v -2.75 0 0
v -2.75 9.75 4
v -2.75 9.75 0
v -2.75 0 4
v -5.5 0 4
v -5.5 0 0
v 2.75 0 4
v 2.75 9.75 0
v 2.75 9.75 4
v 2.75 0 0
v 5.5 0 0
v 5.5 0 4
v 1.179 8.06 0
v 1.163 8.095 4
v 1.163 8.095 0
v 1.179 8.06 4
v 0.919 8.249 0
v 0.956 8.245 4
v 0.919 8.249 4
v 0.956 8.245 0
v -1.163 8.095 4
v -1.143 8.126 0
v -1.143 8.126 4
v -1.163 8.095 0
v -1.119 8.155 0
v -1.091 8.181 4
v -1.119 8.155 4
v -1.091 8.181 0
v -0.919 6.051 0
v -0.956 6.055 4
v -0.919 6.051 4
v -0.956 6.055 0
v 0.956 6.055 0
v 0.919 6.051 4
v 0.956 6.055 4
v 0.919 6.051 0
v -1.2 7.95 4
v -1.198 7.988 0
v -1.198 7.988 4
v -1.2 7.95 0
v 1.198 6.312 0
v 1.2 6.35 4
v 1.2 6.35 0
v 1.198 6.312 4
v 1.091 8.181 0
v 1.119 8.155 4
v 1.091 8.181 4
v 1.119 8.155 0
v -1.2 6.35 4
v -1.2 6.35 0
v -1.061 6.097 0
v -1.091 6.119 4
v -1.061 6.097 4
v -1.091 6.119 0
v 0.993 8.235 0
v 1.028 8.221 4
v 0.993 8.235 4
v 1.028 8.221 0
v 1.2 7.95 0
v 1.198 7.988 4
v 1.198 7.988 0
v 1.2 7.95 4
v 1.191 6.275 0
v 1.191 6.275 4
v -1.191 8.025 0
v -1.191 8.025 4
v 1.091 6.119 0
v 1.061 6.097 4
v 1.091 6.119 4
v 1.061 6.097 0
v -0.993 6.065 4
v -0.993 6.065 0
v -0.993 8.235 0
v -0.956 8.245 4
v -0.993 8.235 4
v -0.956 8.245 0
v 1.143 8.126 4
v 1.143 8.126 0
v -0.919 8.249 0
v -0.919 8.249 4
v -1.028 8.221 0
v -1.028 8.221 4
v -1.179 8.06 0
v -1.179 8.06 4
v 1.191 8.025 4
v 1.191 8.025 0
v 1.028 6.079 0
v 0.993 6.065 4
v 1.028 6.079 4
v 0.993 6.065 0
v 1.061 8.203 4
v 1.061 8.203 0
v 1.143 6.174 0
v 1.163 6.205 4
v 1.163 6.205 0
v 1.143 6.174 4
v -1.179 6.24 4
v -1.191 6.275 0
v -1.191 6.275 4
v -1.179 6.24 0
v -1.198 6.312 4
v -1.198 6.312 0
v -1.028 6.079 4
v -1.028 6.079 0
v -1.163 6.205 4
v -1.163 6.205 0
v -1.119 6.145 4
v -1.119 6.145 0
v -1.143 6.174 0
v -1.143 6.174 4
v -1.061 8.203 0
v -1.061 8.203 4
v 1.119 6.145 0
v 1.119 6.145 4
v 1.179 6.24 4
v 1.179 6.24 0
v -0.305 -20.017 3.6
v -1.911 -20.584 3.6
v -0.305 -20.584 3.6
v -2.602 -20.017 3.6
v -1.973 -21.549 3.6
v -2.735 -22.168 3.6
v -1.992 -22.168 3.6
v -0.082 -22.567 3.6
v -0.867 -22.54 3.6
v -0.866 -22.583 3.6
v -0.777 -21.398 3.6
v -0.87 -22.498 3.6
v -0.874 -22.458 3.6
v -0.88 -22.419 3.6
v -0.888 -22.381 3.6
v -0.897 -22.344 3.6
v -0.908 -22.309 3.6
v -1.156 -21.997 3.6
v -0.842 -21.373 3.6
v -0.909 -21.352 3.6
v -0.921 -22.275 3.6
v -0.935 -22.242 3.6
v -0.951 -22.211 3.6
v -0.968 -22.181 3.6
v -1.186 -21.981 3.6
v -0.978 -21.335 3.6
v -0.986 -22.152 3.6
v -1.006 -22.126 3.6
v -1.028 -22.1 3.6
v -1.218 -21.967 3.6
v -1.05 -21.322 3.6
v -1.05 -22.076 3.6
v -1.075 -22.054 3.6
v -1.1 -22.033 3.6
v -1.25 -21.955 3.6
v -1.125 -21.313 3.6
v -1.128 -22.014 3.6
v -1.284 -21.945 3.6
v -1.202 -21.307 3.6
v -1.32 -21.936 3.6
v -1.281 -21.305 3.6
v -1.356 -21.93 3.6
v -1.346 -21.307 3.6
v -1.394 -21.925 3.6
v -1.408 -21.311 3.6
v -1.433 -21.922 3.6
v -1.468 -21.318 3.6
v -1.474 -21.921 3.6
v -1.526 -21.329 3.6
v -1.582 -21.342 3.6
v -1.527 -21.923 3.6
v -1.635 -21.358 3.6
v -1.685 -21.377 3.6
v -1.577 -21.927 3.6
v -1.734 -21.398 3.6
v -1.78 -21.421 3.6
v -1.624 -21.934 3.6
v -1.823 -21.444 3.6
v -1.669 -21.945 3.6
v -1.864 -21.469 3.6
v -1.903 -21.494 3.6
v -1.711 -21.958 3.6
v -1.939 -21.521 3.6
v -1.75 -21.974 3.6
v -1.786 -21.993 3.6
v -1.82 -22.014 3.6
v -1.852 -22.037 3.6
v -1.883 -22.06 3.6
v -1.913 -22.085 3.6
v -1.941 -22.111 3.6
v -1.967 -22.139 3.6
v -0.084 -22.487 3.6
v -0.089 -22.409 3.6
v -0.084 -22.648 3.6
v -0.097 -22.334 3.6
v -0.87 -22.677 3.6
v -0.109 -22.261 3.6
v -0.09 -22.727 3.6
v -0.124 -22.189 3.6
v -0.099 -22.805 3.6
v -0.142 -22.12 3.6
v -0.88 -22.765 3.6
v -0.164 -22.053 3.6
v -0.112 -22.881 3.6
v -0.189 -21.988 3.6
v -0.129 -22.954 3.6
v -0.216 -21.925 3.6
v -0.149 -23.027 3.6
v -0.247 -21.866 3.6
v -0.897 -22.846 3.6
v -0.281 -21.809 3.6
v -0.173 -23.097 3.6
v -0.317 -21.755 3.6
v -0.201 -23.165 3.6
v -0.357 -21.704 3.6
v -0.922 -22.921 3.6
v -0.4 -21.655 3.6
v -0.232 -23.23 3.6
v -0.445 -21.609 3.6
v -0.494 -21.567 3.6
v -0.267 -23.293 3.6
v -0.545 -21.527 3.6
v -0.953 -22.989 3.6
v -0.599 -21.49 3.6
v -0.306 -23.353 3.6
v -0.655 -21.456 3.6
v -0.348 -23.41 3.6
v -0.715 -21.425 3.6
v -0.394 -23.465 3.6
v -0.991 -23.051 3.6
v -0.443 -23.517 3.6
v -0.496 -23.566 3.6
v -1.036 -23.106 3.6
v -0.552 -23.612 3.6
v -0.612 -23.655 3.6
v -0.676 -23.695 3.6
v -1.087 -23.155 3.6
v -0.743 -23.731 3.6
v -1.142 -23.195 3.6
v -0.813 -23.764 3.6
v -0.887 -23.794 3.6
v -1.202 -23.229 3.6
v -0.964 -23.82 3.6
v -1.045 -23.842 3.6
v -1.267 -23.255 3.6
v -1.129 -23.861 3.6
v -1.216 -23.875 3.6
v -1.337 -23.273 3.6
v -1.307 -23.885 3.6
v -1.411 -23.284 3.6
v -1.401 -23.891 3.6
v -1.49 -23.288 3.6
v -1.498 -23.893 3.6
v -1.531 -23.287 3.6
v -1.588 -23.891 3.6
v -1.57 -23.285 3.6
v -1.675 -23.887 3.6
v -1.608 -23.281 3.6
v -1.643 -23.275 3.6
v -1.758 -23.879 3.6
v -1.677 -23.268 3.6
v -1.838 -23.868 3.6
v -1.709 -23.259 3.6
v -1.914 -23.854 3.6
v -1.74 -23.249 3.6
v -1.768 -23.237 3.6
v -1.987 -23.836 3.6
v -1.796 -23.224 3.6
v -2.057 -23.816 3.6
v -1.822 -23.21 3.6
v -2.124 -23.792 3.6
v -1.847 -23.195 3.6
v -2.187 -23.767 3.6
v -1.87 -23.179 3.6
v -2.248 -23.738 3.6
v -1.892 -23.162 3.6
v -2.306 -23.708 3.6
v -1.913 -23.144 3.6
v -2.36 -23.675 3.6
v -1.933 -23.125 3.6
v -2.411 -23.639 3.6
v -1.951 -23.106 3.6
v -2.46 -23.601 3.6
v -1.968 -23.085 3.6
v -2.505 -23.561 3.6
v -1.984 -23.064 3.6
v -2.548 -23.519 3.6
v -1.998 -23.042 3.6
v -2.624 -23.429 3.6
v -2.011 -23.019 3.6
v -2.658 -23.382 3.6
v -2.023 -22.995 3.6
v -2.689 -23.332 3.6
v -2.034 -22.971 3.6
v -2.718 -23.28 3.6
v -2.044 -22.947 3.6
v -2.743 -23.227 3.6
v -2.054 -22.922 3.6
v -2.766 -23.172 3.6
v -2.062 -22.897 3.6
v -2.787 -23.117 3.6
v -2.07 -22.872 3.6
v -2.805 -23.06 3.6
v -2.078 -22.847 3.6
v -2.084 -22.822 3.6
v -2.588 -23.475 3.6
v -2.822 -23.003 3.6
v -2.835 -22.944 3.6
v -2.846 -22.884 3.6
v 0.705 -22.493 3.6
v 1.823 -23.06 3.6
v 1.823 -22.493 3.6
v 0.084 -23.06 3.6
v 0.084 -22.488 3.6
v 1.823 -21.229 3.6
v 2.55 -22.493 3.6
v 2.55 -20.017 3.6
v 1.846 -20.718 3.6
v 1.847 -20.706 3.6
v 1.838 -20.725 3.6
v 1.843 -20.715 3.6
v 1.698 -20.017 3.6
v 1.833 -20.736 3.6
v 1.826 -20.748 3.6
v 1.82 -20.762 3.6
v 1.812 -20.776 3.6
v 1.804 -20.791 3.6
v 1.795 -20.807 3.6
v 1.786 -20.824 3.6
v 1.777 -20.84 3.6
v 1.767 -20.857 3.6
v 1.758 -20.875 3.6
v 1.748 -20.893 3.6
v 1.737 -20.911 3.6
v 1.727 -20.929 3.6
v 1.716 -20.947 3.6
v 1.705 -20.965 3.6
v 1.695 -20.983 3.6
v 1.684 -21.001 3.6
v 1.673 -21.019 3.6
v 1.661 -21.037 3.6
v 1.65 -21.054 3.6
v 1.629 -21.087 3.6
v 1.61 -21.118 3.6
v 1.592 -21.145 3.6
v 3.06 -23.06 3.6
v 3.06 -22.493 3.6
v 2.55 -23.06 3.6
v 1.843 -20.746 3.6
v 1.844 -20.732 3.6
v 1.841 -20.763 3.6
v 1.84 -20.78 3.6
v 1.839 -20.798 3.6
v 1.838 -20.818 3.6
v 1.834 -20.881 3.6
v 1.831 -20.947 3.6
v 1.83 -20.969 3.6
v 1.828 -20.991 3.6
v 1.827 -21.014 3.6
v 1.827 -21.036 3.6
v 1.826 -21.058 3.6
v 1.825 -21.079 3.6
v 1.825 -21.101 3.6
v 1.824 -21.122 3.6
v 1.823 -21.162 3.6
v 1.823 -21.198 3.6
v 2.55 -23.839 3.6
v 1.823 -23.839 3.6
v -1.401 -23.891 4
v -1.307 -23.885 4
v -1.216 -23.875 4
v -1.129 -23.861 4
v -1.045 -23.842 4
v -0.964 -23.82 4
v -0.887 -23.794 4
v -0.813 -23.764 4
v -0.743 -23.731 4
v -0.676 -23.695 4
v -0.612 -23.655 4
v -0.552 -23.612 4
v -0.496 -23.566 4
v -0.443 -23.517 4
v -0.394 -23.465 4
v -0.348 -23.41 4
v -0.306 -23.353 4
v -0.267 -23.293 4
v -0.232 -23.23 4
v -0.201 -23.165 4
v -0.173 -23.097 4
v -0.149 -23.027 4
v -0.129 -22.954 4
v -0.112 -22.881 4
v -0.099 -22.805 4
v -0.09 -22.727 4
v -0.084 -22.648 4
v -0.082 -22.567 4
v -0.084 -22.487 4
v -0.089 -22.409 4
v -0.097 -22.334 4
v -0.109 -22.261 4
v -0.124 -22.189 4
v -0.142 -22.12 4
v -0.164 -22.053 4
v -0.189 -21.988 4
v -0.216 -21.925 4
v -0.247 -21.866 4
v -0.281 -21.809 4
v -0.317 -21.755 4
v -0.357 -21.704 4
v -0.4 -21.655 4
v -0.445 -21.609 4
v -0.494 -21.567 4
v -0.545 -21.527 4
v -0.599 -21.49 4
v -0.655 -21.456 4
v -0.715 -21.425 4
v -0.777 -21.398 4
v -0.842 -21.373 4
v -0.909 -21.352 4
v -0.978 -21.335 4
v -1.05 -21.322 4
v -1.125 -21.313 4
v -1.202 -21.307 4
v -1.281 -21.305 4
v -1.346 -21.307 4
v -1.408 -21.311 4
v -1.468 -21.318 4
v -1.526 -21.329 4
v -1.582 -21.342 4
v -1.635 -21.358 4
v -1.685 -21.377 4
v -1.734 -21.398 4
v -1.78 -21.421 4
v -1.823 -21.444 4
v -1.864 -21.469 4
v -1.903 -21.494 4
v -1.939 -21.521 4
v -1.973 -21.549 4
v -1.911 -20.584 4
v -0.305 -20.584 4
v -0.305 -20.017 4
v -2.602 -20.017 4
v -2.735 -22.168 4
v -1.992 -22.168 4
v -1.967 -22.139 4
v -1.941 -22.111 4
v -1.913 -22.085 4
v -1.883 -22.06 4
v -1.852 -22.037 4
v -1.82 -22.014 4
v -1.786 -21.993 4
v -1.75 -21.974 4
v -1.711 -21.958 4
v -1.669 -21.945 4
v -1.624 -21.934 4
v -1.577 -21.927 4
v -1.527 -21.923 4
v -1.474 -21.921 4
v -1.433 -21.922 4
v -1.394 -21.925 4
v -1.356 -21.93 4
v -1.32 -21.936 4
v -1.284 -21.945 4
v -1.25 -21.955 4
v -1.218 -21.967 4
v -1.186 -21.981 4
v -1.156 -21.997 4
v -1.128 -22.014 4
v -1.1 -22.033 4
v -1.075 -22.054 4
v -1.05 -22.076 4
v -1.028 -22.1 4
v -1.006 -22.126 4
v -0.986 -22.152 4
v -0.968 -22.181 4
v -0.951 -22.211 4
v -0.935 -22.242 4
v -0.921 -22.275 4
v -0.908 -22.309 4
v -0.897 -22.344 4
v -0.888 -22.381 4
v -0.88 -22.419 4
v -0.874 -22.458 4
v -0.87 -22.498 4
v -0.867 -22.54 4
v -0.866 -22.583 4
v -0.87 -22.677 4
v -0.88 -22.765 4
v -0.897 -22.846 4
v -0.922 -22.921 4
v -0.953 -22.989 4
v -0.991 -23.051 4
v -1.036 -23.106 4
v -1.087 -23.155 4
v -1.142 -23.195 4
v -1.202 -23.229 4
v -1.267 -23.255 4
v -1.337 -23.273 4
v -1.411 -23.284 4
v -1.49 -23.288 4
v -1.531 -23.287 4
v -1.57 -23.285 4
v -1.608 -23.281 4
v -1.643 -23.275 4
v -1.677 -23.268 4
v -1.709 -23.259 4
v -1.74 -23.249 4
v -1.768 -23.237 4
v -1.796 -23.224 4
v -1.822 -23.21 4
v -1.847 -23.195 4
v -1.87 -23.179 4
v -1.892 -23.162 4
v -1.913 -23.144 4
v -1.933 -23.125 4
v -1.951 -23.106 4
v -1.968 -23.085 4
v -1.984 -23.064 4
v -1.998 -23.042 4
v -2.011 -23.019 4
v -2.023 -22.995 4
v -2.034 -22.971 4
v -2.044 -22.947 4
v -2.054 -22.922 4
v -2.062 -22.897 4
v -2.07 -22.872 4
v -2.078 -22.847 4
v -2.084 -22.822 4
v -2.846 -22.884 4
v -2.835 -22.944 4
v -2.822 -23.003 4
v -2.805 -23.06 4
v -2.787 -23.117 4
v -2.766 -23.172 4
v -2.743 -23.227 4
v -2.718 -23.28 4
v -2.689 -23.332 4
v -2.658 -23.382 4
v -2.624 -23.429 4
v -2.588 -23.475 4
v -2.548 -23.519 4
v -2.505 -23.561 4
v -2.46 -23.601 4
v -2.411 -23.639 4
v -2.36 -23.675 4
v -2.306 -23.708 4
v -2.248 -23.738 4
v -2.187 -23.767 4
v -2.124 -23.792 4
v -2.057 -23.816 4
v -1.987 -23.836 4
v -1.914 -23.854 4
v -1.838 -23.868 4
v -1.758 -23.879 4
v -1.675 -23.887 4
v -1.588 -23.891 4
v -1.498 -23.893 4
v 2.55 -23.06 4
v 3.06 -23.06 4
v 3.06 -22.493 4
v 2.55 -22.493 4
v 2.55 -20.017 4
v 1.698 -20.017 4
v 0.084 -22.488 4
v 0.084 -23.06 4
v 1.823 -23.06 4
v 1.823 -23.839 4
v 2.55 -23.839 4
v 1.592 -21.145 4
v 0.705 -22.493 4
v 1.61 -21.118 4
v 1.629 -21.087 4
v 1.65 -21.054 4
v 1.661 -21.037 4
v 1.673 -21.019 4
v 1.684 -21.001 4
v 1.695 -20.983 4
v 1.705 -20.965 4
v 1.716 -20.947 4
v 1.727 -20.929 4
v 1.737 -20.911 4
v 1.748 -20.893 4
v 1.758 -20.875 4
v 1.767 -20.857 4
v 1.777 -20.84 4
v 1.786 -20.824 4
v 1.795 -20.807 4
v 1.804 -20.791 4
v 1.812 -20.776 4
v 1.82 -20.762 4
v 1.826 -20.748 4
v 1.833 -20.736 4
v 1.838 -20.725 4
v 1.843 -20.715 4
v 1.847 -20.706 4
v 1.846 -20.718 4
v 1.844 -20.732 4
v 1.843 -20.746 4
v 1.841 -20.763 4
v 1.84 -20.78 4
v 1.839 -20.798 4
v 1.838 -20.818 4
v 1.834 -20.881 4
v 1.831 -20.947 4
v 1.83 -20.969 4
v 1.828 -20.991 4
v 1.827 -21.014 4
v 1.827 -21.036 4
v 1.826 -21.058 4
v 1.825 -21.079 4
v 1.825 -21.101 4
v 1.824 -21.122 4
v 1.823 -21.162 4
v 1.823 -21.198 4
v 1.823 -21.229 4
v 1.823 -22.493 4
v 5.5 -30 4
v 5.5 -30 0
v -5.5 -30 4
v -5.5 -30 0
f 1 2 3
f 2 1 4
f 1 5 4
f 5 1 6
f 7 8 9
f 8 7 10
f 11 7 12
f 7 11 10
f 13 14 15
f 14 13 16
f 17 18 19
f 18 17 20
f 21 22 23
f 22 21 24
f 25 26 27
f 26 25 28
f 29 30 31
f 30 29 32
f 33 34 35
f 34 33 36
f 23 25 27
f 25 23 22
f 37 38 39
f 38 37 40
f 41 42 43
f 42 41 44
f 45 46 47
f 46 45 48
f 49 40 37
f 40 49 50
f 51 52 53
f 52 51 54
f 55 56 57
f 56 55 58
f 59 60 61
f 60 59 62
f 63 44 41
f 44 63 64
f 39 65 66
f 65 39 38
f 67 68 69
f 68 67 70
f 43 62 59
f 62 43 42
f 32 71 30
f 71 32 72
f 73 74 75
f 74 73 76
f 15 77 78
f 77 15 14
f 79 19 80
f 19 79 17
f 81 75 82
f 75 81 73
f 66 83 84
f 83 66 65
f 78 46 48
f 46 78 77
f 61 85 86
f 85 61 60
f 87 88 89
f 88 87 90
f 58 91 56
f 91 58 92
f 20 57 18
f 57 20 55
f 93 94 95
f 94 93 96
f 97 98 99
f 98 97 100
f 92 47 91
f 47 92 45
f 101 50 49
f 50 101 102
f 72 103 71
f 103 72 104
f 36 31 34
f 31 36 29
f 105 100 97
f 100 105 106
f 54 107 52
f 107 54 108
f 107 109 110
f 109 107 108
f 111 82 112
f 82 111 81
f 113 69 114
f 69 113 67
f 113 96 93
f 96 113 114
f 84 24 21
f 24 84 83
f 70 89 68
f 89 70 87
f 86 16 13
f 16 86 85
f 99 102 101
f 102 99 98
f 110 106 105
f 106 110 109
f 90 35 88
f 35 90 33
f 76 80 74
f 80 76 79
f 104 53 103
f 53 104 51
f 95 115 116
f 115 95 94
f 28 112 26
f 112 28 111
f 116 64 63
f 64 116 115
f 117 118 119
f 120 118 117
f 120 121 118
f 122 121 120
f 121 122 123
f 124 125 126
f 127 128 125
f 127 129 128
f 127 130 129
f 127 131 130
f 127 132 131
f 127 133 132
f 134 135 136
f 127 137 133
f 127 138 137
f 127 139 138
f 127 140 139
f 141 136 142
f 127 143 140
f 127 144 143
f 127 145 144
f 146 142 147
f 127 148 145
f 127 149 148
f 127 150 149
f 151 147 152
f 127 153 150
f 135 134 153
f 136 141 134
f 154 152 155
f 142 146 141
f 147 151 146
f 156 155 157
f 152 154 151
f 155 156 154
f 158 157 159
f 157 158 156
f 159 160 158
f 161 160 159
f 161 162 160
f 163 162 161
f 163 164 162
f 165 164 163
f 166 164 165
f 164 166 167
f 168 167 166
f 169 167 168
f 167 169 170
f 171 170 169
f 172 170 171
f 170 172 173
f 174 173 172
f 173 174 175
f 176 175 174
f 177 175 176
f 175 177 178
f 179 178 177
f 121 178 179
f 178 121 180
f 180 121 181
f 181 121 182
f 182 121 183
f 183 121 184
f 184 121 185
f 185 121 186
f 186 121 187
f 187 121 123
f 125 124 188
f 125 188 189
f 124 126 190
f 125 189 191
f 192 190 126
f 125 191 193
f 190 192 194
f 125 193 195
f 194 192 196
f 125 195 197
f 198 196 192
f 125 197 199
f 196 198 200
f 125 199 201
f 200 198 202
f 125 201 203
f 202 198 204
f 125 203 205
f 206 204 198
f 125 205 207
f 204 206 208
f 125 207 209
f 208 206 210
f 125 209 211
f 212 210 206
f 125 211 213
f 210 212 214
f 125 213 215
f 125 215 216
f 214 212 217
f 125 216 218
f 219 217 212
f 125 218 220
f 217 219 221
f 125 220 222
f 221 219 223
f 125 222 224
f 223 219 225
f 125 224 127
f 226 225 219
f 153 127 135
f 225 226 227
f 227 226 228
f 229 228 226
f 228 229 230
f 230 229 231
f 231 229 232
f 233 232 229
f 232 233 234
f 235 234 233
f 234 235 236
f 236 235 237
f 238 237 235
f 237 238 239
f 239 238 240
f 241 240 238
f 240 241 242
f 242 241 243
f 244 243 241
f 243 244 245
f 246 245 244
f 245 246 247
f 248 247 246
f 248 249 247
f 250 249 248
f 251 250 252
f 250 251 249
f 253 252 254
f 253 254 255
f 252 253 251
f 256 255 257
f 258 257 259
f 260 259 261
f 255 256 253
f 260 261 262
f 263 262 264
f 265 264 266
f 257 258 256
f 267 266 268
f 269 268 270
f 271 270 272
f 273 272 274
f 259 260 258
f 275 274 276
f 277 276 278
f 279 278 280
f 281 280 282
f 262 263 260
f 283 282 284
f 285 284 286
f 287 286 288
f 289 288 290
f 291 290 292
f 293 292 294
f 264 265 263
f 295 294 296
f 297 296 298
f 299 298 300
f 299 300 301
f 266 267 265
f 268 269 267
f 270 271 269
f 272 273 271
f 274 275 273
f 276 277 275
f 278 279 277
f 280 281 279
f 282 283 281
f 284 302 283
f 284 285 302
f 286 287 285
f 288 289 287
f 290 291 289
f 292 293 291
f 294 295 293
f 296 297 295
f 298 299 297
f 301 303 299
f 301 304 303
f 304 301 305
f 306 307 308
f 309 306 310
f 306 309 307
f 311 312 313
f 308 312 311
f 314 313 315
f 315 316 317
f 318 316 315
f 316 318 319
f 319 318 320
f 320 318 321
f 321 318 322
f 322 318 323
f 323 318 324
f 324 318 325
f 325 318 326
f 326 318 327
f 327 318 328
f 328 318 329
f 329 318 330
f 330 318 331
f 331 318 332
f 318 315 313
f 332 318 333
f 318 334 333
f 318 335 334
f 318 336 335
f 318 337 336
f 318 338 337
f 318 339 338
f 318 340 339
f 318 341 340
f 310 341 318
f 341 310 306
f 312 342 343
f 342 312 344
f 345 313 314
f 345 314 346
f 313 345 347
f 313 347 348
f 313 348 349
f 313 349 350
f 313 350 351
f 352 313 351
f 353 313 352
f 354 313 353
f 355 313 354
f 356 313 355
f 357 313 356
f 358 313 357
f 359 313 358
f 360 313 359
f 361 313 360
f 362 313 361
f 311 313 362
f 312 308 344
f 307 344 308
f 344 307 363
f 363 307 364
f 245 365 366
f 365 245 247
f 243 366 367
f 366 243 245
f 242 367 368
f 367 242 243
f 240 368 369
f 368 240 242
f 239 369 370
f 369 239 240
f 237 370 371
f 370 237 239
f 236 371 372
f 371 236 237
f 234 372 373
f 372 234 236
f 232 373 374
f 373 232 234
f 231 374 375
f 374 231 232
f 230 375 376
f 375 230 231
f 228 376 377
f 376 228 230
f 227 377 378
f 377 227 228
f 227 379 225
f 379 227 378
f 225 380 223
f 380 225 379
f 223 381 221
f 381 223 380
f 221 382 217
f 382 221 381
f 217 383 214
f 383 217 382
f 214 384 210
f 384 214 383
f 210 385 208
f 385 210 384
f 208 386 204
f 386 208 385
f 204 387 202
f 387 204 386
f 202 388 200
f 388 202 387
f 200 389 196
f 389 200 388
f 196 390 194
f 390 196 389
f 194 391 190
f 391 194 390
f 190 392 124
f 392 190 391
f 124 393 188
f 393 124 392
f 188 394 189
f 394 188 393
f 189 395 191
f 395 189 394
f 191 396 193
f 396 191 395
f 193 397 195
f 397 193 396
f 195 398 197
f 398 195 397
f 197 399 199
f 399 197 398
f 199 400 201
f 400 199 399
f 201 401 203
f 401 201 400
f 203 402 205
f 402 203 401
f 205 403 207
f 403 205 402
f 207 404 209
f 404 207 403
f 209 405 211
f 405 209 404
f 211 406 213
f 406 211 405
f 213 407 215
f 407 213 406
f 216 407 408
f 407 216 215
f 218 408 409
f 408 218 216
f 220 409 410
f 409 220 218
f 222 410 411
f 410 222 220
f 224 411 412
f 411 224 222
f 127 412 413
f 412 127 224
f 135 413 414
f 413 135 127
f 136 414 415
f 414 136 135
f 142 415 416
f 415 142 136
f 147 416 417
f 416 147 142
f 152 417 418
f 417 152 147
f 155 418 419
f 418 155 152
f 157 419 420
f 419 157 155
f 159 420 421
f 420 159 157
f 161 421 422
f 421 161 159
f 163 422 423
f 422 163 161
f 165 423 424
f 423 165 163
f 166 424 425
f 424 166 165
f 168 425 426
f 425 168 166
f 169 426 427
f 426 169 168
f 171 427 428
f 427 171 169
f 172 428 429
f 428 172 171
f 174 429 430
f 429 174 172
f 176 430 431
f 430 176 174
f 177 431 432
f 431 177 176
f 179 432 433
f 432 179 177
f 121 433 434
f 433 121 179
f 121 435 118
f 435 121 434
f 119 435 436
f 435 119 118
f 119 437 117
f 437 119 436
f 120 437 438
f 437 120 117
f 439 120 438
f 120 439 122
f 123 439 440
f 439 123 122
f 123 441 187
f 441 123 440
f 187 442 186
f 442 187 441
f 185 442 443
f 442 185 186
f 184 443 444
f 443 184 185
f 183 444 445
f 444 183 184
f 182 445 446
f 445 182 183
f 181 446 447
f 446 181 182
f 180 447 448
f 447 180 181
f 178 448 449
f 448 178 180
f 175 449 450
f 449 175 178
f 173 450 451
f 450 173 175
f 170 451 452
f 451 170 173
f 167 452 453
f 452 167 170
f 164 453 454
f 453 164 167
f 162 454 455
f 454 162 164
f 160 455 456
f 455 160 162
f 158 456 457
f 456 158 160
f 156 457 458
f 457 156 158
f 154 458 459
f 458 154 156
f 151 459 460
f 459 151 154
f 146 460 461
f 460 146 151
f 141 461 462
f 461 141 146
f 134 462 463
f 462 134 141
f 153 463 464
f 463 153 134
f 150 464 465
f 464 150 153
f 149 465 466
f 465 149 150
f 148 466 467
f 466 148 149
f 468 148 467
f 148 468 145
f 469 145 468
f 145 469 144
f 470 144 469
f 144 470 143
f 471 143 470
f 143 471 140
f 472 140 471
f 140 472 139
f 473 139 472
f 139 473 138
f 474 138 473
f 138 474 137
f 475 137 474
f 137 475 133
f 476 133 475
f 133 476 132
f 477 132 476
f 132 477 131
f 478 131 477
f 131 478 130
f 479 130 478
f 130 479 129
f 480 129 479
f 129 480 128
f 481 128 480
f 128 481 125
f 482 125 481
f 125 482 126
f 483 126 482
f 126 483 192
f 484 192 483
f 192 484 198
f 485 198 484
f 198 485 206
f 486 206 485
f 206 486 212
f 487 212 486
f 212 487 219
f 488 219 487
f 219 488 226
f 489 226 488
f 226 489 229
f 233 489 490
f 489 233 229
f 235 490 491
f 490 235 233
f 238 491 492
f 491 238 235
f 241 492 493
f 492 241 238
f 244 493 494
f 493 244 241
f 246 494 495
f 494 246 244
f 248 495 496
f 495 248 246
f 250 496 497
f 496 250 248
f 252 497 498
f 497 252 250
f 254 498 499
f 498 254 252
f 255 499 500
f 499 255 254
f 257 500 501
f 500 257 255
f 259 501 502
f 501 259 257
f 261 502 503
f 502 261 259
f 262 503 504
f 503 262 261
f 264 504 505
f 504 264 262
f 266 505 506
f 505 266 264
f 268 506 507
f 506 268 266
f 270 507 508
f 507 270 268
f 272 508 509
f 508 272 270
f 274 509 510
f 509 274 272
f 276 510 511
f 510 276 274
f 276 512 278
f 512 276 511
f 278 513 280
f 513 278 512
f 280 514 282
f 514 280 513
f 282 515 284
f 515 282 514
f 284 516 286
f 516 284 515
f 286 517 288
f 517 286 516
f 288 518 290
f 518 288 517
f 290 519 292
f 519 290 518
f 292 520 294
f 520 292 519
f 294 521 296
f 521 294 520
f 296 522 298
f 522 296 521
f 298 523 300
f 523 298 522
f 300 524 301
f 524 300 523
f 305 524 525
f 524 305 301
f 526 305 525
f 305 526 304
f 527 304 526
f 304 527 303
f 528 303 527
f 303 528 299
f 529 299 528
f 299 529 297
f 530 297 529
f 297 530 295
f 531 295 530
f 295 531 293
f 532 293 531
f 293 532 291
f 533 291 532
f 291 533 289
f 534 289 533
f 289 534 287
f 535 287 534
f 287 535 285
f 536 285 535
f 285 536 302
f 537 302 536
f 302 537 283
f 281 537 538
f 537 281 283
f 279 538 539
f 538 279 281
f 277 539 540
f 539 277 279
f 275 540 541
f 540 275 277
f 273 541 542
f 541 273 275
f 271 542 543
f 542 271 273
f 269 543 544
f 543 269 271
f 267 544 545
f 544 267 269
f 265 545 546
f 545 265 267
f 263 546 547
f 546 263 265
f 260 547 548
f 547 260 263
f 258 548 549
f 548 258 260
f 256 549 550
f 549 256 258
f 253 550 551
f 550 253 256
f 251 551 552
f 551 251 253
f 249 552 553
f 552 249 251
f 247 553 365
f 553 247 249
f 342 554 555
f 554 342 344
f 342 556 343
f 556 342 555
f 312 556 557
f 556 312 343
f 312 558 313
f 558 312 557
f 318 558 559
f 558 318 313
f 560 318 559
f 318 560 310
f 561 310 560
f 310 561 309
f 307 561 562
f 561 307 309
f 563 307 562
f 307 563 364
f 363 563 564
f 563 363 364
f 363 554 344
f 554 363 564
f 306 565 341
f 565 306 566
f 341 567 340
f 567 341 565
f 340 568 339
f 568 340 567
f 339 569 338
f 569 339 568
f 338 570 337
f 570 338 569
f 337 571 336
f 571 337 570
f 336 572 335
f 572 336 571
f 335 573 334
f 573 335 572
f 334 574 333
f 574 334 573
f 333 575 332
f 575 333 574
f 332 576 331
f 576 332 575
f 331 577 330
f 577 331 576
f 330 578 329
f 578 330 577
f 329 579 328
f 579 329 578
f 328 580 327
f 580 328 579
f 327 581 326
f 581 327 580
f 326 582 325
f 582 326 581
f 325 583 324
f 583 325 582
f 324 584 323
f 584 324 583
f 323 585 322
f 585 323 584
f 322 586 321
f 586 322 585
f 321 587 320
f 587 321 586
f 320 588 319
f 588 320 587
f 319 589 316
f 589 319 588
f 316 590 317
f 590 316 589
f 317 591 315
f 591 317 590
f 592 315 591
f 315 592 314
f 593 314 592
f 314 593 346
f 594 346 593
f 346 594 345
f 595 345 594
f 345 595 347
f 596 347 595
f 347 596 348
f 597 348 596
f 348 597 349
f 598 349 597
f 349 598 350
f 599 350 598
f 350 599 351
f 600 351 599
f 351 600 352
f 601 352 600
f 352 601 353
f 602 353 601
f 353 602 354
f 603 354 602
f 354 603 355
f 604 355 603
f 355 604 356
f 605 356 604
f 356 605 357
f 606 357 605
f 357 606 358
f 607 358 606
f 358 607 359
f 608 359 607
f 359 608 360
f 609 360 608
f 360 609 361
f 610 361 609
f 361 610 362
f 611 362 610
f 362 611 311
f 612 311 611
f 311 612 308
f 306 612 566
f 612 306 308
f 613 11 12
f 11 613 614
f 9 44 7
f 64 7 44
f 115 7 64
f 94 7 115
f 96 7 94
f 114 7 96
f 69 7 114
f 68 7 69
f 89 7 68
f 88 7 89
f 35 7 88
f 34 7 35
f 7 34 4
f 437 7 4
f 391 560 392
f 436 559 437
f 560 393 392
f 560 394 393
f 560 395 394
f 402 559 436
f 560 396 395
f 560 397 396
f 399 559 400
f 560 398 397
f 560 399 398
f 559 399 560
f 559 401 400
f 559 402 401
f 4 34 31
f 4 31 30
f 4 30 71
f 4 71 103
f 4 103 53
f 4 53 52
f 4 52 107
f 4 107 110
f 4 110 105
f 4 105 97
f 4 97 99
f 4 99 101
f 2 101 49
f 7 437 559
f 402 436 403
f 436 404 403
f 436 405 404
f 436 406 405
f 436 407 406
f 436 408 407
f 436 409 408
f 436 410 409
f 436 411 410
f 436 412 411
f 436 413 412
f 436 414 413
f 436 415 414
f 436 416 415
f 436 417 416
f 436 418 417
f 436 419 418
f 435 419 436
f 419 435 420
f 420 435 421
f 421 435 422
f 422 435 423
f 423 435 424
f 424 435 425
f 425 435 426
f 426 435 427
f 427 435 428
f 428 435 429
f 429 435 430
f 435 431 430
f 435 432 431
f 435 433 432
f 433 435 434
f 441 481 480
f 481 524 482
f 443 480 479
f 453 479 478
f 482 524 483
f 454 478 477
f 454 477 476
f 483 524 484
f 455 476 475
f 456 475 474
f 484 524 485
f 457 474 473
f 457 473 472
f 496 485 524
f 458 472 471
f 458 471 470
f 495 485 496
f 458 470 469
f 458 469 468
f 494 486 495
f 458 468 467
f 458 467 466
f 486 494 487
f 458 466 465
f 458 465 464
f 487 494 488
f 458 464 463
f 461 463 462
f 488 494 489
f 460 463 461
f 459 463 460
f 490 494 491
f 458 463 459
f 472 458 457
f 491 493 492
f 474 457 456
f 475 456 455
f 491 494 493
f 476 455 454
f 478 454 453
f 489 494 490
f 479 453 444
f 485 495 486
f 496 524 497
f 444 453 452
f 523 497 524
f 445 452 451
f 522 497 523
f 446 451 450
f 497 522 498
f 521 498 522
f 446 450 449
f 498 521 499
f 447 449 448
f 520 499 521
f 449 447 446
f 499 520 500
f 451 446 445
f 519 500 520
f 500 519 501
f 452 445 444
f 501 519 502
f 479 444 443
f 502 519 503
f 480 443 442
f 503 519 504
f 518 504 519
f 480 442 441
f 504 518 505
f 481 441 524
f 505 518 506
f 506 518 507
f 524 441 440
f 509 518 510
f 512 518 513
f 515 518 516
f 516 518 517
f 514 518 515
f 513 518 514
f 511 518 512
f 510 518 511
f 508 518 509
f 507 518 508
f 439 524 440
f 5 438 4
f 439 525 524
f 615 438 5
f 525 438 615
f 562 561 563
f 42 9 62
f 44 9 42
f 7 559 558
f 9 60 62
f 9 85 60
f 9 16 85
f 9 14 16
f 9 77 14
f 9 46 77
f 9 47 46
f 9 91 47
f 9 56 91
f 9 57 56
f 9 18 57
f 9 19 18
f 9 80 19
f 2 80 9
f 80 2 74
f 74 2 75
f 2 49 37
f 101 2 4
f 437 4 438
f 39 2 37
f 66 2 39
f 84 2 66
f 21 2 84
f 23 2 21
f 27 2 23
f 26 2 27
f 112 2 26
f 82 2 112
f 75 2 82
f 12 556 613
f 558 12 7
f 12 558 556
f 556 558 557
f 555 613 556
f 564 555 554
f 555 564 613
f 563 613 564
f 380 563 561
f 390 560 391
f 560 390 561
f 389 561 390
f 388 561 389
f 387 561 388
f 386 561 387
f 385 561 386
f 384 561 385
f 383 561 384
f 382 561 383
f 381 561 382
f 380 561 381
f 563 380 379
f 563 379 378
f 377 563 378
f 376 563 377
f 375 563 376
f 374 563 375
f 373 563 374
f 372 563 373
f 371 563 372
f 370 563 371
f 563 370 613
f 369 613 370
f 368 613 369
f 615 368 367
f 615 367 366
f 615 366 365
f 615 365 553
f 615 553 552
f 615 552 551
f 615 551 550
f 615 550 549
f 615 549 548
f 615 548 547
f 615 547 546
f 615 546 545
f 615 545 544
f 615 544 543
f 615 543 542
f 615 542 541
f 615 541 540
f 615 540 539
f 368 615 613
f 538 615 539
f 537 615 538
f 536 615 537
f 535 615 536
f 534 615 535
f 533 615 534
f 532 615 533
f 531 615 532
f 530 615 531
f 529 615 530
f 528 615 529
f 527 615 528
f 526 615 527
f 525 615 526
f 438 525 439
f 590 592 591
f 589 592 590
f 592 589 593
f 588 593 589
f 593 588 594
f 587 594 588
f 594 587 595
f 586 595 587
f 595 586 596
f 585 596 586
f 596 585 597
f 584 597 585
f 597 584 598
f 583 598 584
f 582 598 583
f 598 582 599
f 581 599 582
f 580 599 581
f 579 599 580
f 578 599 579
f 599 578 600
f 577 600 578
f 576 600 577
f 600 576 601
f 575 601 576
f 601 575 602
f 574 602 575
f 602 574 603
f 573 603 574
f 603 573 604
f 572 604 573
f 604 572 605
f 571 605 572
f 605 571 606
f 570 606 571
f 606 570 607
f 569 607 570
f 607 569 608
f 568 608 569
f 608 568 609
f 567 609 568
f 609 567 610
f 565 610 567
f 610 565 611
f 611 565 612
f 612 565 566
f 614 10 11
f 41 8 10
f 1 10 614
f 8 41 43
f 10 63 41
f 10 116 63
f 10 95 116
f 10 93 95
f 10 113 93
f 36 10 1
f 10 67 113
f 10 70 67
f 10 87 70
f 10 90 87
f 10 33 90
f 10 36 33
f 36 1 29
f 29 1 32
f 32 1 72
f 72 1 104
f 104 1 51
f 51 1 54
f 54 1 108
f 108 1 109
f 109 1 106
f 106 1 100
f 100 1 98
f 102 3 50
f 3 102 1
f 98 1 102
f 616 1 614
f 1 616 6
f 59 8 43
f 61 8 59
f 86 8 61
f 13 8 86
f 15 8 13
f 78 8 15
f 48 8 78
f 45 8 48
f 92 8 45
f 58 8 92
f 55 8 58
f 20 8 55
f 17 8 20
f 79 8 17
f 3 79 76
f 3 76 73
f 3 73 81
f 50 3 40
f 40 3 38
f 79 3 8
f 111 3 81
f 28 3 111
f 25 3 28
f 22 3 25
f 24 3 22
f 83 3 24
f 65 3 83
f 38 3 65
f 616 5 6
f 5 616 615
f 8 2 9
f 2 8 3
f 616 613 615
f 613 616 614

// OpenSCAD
$fn = 50;

difference() {
	union() {
		translate(v = [0, 0, 0]) {
			rotate(a = [0, 0, 0]) {
				difference() {
					union() {
						translate(v = [-5.5, -30.0, 0]) {
							cube(size = [11.0, 39.75, 4.0]);
						}
					}
					union() {
						translate(v = [-5.6, 0, -0.1]) {
							cube(size = [2.85, 9.95, 4.2]);
						}
						translate(v = [2.75, 0, -0.1]) {
							cube(size = [2.85, 9.95, 4.2]);
						}
						translate(v = [0, 7.15, -0.1]) {
							hull() {
								translate(v = [-0.8999999999999999, 0.8, 0]) {
									cylinder(h = 4.2, r = 0.3);
								}
								translate(v = [0.8999999999999999, 0.8, 0]) {
									cylinder(h = 4.2, r = 0.3);
								}
								translate(v = [-0.8999999999999999, -0.8, 0]) {
									cylinder(h = 4.2, r = 0.3);
								}
								translate(v = [0.8999999999999999, -0.8, 0]) {
									cylinder(h = 4.2, r = 0.3);
								}
							}
						}
						translate(v = [0, -22, 3.6]) {
							linear_extrude(height = 0.5) {
								text(font = "Arial:style=Bold", halign = "center", size = 4.0, text = "54", valign = "center");
							}
						}
					}
				}
			}
		}
	}
	union();
}
